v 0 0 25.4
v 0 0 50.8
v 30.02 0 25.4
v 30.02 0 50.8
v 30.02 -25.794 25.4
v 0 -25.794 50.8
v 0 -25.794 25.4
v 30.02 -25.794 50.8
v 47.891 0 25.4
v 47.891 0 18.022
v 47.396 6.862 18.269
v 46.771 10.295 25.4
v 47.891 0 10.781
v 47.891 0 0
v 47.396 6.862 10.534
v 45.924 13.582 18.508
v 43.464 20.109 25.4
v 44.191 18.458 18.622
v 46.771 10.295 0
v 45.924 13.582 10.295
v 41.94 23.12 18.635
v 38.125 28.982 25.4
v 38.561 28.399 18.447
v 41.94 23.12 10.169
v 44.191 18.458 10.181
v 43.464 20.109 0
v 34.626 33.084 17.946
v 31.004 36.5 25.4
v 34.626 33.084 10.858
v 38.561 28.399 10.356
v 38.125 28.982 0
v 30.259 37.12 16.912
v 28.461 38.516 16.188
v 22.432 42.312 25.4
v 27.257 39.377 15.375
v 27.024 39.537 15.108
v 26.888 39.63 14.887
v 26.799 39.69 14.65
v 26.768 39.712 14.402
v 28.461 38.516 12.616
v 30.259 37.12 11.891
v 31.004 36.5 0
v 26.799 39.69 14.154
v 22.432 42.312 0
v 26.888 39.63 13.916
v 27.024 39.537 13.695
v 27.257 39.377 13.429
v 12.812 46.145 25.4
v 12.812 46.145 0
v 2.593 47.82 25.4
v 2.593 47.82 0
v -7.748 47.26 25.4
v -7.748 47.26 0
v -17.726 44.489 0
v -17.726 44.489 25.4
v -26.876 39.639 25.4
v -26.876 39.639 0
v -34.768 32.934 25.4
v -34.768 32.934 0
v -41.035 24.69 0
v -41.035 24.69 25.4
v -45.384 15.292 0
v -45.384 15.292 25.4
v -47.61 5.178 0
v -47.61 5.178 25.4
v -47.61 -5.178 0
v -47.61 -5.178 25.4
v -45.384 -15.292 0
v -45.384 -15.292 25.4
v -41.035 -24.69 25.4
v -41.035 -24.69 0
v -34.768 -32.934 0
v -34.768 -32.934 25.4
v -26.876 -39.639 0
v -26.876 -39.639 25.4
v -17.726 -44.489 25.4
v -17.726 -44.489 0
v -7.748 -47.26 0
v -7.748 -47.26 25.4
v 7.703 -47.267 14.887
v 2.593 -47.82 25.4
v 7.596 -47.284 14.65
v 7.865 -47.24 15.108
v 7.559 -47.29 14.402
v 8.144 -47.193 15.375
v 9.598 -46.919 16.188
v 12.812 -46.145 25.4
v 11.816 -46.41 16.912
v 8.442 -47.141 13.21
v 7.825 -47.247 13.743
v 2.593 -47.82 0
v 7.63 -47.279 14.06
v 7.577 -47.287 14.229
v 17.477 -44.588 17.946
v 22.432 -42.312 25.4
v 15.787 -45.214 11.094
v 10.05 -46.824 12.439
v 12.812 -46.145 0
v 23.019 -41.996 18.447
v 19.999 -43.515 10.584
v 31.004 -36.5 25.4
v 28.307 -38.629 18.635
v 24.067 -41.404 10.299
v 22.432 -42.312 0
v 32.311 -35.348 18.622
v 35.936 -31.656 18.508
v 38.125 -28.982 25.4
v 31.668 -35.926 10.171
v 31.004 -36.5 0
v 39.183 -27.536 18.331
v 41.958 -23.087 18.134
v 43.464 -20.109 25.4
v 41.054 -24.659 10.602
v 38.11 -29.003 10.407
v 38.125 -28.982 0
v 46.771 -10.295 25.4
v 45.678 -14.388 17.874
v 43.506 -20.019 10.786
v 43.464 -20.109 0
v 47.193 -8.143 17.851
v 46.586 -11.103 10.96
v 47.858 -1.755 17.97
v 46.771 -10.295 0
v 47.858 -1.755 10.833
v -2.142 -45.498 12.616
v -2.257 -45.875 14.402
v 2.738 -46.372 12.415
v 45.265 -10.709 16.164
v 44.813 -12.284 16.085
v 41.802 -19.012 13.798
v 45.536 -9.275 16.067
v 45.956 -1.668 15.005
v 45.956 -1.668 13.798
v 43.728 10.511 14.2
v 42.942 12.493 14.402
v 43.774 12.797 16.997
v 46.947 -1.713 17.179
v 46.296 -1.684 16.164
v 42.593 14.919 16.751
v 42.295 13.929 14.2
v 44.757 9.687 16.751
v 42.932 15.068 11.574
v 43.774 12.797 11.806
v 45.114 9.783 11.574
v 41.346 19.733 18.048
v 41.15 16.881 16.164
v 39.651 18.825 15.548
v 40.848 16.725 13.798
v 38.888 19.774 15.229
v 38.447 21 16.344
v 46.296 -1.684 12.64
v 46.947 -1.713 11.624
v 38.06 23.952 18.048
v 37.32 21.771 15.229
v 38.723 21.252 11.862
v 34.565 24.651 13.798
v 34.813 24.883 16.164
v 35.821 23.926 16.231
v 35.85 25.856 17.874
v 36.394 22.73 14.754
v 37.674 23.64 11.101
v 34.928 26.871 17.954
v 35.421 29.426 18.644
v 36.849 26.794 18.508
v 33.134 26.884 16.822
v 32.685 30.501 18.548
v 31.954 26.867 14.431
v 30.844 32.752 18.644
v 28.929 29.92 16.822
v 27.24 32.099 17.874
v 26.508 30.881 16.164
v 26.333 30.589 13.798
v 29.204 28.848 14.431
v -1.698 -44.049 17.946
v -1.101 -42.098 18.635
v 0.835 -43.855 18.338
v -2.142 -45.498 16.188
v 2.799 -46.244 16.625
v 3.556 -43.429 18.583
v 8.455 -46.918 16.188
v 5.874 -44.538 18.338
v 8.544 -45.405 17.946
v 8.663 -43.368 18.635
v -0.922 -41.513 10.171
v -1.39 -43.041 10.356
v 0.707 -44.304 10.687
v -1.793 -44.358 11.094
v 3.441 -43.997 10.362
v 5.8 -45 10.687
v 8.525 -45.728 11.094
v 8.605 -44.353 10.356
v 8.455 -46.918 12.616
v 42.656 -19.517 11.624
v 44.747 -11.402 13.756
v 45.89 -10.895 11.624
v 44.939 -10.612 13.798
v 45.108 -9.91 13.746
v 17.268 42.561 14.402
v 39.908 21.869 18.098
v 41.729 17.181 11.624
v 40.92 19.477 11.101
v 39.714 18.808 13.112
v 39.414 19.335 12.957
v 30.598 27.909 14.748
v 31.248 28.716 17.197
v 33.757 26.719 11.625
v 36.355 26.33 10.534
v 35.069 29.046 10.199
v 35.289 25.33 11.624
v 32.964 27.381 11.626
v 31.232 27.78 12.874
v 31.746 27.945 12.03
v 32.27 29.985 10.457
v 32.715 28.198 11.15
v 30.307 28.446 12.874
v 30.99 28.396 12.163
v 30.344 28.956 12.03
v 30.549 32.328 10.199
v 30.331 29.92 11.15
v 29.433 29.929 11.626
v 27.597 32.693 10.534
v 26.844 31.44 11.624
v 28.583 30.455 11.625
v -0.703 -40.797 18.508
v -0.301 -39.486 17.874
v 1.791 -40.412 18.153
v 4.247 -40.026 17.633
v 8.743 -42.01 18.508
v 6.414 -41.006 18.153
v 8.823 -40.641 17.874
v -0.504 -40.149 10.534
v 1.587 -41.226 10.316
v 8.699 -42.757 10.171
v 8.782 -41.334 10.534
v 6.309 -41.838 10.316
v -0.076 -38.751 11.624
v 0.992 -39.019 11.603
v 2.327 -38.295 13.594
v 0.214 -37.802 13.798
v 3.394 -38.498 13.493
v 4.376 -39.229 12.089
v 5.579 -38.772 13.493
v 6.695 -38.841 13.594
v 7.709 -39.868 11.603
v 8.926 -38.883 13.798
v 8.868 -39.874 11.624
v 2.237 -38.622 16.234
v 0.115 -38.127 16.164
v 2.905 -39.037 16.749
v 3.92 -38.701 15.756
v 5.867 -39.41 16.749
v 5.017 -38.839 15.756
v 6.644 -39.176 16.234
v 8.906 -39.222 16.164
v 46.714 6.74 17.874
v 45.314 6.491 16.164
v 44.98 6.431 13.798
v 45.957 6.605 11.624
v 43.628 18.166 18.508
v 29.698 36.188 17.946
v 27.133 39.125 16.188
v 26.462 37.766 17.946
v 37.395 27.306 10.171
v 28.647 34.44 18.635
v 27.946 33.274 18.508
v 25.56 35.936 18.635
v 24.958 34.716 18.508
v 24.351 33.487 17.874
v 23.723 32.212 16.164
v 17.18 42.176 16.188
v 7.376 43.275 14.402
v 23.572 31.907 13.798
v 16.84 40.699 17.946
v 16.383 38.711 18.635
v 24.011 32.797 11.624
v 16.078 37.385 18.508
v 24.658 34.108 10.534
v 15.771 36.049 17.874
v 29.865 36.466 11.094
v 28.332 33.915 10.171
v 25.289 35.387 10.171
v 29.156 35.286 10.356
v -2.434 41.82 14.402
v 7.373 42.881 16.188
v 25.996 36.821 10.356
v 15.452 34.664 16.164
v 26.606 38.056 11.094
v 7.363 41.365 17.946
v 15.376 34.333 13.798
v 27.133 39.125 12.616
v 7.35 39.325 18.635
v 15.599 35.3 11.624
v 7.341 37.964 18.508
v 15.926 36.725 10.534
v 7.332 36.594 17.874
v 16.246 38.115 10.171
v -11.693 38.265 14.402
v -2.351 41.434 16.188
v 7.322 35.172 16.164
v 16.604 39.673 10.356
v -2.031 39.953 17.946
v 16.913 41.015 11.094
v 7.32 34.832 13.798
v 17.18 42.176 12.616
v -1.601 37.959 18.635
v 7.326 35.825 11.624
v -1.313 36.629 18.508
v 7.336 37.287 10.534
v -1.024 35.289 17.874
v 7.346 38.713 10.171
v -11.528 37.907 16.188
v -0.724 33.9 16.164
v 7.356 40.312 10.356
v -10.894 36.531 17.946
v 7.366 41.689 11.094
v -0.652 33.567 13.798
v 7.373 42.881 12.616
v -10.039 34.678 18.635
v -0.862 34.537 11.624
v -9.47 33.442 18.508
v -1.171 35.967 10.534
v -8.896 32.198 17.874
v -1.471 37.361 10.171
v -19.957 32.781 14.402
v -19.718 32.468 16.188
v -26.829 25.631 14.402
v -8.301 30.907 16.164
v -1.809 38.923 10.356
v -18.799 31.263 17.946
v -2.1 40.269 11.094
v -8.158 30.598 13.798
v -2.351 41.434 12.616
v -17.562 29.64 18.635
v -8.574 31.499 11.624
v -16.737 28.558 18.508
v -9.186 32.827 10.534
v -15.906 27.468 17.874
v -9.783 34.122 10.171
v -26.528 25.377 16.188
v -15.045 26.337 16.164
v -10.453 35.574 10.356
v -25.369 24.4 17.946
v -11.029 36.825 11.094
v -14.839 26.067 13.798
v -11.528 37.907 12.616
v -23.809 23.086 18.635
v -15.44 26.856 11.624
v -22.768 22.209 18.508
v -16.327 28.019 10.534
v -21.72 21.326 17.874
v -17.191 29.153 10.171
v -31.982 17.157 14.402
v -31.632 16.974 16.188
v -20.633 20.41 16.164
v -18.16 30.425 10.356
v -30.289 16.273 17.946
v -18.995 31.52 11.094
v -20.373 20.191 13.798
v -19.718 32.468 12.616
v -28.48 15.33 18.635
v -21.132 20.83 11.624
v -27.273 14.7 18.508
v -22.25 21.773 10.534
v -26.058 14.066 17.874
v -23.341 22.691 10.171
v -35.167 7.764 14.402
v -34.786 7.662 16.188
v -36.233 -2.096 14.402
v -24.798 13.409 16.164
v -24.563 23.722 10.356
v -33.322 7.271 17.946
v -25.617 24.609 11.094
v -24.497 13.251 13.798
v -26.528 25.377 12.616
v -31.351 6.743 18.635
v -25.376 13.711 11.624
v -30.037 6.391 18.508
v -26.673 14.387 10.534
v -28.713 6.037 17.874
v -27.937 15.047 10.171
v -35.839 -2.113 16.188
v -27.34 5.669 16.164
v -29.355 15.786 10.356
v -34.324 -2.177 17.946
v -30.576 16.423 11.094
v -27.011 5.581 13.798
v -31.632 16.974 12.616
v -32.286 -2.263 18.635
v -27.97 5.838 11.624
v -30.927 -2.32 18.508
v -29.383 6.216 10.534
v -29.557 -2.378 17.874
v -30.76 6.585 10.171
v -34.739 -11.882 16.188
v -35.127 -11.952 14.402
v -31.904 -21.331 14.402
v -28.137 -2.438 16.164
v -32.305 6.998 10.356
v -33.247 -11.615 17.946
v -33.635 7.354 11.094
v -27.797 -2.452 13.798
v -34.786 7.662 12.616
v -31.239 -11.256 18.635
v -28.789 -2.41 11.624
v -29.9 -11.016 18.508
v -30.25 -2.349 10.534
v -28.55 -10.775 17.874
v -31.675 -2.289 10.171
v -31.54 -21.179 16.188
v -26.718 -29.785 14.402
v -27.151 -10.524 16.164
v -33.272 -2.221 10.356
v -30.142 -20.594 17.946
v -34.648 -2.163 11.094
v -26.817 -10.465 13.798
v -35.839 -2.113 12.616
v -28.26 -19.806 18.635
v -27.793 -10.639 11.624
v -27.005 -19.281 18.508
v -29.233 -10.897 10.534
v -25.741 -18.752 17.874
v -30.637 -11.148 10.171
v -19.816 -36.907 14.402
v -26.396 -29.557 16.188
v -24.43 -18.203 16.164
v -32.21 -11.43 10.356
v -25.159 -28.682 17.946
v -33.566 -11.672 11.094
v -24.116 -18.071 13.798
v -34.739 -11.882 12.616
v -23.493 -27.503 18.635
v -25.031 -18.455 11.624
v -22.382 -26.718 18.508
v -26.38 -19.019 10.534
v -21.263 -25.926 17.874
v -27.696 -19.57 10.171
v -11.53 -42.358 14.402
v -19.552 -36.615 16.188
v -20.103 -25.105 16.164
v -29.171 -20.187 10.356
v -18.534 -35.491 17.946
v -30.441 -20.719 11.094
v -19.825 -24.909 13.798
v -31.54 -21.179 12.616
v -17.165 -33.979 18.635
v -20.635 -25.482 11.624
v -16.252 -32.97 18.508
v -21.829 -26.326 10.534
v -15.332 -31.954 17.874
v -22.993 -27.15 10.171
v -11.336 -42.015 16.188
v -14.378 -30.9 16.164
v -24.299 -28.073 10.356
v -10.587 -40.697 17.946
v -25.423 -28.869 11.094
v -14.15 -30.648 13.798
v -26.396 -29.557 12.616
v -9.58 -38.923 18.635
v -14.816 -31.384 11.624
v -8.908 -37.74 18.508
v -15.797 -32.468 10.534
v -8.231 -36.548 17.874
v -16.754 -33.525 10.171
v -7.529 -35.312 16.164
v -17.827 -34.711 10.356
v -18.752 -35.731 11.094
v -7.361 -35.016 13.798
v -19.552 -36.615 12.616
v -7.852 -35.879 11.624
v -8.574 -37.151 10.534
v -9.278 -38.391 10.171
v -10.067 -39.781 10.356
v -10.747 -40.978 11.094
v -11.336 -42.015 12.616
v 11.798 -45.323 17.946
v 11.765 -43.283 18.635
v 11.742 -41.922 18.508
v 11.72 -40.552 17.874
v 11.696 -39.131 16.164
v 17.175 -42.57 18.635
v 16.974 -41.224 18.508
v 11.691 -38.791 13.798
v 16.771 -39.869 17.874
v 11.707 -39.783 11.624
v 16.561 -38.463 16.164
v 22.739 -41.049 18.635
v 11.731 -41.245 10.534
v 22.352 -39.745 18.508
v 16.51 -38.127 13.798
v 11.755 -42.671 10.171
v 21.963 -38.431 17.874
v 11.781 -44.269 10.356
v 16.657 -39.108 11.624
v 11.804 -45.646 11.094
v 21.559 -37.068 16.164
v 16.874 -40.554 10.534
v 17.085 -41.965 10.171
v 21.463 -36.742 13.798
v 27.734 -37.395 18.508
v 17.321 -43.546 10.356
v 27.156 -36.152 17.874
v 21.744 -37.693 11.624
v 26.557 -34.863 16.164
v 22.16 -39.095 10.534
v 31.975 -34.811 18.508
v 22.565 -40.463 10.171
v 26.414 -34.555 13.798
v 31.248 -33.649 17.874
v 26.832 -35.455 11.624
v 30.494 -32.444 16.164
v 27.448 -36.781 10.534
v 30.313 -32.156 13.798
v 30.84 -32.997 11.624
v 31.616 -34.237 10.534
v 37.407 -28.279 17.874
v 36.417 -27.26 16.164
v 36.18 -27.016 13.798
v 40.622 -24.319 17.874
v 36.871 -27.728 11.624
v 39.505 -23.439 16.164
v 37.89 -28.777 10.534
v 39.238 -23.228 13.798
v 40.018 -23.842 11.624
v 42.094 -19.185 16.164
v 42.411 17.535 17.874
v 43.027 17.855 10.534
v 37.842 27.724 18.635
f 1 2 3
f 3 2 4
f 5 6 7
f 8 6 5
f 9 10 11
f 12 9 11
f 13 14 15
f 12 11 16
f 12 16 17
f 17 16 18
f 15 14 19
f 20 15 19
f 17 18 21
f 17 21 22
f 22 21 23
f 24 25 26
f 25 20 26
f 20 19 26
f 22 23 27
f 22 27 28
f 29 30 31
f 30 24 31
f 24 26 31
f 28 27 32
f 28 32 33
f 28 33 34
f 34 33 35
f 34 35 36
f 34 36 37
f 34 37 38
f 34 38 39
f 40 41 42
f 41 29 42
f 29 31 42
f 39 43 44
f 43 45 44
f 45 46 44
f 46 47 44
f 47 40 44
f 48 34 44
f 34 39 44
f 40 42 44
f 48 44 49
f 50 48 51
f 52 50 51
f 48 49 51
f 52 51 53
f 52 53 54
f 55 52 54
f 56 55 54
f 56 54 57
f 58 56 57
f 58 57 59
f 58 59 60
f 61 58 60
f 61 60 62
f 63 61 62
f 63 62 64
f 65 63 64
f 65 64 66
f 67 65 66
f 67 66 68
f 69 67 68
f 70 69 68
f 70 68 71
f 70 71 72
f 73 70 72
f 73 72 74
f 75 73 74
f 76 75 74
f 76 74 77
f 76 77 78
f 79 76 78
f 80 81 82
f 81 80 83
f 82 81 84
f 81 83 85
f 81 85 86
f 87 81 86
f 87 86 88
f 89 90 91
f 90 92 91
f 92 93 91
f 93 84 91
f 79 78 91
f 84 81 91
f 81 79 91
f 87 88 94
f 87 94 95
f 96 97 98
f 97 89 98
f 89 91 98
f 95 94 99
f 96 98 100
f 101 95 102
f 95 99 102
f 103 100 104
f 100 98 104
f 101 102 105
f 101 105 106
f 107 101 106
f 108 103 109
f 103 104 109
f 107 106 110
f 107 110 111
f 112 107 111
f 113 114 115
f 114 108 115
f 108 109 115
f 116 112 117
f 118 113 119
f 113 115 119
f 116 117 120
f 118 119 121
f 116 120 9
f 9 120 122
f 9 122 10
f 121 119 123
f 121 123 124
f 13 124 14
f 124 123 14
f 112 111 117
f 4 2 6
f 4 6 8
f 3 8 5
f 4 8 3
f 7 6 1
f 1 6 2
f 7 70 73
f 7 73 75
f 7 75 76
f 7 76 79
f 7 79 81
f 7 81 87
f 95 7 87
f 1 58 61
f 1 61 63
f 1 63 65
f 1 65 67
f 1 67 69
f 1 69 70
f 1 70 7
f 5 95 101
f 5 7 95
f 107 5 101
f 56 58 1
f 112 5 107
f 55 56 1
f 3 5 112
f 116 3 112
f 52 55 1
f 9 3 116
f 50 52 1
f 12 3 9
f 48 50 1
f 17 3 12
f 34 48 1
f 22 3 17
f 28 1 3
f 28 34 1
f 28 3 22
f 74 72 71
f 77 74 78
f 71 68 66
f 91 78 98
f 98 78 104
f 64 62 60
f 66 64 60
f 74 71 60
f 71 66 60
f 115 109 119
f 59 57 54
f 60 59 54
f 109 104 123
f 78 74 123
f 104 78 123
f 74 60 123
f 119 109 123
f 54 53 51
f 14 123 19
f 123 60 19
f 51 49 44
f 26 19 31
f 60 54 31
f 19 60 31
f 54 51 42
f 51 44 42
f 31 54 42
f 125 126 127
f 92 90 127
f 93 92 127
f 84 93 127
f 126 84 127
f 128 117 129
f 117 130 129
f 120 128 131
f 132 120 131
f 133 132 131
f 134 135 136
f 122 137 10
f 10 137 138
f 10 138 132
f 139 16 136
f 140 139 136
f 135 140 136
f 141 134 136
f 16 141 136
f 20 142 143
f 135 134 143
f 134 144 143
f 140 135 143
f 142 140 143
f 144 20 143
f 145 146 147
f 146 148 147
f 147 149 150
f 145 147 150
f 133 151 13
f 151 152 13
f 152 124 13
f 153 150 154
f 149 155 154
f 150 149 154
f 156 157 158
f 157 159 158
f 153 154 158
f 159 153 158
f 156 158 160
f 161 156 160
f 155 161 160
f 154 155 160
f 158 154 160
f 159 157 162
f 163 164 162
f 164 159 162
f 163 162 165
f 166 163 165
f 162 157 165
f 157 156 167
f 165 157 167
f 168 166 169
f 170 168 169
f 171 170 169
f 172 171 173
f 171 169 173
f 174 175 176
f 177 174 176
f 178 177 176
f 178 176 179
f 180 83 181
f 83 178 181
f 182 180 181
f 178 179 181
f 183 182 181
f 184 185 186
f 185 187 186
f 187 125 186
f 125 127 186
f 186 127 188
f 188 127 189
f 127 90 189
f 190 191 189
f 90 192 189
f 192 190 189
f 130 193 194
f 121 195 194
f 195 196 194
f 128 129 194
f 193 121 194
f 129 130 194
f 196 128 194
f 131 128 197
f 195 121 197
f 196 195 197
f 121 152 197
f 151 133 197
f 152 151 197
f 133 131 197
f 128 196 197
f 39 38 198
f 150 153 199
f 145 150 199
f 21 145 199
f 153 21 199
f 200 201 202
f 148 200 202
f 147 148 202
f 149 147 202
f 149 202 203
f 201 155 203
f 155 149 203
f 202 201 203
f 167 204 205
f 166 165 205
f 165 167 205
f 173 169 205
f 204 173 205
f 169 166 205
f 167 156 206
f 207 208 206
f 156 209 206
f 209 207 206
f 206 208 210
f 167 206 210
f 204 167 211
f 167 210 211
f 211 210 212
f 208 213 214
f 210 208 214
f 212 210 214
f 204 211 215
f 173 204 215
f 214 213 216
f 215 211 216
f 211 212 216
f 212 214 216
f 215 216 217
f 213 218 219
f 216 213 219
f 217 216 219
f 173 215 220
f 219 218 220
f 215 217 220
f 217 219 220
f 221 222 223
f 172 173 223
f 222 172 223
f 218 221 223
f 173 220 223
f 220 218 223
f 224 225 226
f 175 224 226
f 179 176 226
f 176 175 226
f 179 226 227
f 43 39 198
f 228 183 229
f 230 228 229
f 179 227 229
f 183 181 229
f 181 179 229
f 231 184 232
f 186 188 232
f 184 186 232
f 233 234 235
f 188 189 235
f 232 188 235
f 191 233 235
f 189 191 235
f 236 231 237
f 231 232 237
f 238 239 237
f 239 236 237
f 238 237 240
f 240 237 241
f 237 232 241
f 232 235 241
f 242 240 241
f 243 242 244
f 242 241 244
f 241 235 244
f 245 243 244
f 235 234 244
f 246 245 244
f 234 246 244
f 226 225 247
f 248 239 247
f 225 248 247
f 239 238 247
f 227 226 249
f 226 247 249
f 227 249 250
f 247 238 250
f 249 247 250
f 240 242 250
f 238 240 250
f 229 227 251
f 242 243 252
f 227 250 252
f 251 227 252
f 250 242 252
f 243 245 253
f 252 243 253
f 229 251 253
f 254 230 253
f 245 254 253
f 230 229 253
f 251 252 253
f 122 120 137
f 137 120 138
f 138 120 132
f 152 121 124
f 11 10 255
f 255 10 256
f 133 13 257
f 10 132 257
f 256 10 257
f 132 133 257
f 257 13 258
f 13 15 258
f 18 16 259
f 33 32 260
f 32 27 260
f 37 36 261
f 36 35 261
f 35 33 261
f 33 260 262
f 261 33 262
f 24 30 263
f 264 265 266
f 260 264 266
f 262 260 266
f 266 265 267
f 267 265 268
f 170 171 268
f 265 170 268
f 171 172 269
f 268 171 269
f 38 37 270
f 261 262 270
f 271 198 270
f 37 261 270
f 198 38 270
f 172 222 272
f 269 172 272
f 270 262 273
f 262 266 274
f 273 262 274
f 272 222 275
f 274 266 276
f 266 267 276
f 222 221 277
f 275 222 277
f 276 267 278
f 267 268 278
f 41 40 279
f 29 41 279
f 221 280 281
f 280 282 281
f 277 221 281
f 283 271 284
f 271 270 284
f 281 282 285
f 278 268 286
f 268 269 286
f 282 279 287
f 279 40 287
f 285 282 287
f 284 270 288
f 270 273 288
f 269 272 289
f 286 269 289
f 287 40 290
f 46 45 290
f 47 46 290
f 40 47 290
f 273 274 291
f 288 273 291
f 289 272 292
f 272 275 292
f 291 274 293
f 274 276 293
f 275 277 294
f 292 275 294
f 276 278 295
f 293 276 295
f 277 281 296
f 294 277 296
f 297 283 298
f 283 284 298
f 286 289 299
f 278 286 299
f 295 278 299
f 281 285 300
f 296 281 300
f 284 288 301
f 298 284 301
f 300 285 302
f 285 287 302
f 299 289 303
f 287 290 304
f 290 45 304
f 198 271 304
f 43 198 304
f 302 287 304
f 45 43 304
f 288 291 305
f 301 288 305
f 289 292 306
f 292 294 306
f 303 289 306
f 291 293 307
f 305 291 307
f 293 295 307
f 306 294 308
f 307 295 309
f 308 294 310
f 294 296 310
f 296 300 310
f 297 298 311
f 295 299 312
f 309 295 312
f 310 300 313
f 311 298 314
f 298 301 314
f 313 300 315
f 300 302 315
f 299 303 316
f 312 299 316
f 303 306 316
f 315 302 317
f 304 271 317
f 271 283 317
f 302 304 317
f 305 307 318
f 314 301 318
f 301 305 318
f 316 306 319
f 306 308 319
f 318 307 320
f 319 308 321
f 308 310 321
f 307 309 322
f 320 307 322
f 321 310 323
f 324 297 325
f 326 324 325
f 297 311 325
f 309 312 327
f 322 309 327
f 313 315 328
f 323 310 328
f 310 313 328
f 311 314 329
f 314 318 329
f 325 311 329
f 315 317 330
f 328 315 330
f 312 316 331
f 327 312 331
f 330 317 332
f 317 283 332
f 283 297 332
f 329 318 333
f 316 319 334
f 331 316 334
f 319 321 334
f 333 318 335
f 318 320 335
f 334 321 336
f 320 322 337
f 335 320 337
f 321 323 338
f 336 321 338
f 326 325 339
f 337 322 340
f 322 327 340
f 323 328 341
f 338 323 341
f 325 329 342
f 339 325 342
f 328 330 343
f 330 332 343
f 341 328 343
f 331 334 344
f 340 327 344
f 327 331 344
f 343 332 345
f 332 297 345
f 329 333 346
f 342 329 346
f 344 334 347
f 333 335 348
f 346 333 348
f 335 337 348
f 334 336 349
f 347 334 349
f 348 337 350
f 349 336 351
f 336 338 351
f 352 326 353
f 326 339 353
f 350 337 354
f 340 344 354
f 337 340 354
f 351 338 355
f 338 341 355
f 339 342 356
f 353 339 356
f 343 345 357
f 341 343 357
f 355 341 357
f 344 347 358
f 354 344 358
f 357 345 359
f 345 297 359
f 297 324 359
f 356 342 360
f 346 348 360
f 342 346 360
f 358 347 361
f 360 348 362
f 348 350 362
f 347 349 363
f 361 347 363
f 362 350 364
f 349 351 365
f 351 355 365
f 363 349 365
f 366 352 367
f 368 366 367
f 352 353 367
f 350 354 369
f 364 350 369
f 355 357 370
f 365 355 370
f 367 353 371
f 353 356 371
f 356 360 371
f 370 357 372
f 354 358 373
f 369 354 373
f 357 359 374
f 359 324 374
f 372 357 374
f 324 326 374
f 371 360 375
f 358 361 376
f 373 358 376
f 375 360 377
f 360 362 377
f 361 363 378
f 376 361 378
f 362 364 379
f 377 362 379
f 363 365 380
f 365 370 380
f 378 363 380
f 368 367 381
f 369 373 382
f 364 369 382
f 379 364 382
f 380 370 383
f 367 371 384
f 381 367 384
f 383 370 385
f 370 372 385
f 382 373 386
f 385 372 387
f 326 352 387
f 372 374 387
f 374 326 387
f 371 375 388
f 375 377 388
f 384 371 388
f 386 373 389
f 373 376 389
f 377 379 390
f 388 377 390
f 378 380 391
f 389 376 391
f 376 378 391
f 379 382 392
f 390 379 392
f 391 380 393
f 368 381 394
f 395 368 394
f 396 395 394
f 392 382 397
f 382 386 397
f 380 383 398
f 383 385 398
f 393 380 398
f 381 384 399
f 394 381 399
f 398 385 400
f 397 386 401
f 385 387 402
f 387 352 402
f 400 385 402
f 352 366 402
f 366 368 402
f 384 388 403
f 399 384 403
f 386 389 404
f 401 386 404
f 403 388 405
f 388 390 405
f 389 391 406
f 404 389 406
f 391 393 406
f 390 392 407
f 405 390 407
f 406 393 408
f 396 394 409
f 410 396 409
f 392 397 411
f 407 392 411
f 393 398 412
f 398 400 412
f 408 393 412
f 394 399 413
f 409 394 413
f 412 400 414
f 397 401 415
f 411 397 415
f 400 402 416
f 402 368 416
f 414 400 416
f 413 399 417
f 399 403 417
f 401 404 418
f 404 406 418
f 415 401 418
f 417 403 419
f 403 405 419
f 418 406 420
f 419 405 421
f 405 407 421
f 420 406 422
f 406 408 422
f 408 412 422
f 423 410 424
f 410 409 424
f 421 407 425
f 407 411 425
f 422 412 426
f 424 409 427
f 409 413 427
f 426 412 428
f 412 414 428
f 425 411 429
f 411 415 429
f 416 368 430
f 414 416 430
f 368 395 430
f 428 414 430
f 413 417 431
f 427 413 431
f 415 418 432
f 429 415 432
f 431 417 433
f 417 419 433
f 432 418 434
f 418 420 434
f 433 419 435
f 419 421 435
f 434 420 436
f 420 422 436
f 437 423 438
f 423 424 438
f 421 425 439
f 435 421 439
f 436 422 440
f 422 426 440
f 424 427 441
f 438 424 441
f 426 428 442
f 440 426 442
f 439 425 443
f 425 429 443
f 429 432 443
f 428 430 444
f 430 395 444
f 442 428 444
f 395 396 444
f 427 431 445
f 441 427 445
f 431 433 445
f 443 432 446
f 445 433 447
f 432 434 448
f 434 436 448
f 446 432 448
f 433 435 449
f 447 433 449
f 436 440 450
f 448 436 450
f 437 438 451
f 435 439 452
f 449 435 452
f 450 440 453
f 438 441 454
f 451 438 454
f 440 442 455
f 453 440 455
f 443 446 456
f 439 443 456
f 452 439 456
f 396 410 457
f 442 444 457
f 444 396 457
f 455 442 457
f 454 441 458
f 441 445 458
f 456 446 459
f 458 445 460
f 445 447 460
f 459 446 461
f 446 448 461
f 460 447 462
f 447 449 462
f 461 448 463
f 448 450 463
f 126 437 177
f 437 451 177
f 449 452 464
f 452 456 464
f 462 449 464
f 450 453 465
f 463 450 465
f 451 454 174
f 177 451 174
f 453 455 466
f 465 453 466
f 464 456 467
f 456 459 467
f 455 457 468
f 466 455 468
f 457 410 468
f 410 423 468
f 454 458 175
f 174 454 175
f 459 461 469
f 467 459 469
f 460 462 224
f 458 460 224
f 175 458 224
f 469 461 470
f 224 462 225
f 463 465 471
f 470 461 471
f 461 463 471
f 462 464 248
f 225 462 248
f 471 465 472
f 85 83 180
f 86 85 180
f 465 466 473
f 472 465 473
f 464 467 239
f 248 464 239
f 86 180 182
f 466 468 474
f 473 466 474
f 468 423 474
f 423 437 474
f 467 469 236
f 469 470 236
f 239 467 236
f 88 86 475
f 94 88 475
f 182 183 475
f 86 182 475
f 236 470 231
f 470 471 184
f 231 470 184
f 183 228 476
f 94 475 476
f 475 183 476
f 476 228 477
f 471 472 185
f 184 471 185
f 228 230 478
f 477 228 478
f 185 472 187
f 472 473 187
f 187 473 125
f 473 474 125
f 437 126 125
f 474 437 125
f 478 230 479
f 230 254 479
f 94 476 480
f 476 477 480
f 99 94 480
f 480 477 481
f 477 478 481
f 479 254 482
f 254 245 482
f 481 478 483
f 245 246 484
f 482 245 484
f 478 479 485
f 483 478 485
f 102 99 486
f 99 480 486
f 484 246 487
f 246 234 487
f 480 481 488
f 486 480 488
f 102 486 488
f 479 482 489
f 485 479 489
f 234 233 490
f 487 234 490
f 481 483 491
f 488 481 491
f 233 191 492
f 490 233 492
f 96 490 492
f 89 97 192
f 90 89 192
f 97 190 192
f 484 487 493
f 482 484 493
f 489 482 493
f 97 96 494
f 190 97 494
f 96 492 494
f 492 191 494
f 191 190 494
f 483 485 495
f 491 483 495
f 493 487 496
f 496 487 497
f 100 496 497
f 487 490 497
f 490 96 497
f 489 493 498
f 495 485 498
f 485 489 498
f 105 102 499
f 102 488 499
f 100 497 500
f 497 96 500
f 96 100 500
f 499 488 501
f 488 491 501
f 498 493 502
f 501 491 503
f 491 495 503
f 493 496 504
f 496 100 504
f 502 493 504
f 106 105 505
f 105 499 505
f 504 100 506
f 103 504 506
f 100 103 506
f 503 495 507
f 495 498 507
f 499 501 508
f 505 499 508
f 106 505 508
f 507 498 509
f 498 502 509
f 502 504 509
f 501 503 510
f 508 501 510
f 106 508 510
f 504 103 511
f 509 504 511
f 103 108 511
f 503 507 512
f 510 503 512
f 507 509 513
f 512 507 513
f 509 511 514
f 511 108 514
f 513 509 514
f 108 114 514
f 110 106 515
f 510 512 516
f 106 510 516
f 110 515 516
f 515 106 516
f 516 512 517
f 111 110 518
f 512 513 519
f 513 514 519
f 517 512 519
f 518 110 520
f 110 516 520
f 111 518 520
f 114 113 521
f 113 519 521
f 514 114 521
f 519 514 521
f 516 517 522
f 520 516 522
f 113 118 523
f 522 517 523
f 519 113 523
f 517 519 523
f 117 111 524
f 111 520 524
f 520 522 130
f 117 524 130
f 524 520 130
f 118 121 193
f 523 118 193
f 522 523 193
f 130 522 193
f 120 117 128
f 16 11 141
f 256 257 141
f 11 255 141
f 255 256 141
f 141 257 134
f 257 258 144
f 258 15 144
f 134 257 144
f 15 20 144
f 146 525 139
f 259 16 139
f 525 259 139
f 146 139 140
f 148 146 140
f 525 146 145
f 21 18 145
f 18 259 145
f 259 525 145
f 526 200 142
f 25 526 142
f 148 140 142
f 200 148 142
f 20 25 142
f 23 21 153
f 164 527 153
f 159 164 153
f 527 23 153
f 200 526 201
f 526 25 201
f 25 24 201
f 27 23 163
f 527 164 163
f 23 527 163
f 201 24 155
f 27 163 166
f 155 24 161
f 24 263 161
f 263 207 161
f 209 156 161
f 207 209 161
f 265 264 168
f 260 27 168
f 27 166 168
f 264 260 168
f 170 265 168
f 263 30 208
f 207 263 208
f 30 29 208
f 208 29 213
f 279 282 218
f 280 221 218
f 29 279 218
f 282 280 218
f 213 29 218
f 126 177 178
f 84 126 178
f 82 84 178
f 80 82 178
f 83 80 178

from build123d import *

# Parameters (mm, degrees)
F1_R     = 47.8906341697
F3_DEPTH = 25.4
F2_W     = 30.0199426711
F2_H     = 25.7944688201
F4_DEPTH = 25.4
F7_R     = 4.2429445986


# Not quite as in the source:
# - a feature of the source that left no trace in its solid (it failed there, or was rolled back) is left out


with BuildPart() as f3:
    # F1 (on Top) → F3 (new body)
    with BuildSketch(Plane.XY):
        Circle(F1_R)
    extrude(amount=F3_DEPTH)

    # F2 (on offset) → F4 (join)
    with BuildSketch(Plane.XY.offset(50.8)):
        with Locations((15.0099713355, -12.89723441)):
            Rectangle(F2_W, F2_H)
    extrude(amount=-F4_DEPTH)

    # F8: sweep along a path in F6
    with BuildLine(Plane.XY.offset(12.7)) as f8_path:
        CenterArc((9.0787773952, -2.0044676494), 44.2959341801, 0, 360)
    # F7 (on Front) → F8 (sweep, cut)
    with BuildSketch(Plane.XZ):
        with Locations((50.1028448343, 14.4018204883)):
            Circle(F7_R)
    sweep(path=f8_path.line, mode=Mode.SUBTRACT)


solid = f3.part
